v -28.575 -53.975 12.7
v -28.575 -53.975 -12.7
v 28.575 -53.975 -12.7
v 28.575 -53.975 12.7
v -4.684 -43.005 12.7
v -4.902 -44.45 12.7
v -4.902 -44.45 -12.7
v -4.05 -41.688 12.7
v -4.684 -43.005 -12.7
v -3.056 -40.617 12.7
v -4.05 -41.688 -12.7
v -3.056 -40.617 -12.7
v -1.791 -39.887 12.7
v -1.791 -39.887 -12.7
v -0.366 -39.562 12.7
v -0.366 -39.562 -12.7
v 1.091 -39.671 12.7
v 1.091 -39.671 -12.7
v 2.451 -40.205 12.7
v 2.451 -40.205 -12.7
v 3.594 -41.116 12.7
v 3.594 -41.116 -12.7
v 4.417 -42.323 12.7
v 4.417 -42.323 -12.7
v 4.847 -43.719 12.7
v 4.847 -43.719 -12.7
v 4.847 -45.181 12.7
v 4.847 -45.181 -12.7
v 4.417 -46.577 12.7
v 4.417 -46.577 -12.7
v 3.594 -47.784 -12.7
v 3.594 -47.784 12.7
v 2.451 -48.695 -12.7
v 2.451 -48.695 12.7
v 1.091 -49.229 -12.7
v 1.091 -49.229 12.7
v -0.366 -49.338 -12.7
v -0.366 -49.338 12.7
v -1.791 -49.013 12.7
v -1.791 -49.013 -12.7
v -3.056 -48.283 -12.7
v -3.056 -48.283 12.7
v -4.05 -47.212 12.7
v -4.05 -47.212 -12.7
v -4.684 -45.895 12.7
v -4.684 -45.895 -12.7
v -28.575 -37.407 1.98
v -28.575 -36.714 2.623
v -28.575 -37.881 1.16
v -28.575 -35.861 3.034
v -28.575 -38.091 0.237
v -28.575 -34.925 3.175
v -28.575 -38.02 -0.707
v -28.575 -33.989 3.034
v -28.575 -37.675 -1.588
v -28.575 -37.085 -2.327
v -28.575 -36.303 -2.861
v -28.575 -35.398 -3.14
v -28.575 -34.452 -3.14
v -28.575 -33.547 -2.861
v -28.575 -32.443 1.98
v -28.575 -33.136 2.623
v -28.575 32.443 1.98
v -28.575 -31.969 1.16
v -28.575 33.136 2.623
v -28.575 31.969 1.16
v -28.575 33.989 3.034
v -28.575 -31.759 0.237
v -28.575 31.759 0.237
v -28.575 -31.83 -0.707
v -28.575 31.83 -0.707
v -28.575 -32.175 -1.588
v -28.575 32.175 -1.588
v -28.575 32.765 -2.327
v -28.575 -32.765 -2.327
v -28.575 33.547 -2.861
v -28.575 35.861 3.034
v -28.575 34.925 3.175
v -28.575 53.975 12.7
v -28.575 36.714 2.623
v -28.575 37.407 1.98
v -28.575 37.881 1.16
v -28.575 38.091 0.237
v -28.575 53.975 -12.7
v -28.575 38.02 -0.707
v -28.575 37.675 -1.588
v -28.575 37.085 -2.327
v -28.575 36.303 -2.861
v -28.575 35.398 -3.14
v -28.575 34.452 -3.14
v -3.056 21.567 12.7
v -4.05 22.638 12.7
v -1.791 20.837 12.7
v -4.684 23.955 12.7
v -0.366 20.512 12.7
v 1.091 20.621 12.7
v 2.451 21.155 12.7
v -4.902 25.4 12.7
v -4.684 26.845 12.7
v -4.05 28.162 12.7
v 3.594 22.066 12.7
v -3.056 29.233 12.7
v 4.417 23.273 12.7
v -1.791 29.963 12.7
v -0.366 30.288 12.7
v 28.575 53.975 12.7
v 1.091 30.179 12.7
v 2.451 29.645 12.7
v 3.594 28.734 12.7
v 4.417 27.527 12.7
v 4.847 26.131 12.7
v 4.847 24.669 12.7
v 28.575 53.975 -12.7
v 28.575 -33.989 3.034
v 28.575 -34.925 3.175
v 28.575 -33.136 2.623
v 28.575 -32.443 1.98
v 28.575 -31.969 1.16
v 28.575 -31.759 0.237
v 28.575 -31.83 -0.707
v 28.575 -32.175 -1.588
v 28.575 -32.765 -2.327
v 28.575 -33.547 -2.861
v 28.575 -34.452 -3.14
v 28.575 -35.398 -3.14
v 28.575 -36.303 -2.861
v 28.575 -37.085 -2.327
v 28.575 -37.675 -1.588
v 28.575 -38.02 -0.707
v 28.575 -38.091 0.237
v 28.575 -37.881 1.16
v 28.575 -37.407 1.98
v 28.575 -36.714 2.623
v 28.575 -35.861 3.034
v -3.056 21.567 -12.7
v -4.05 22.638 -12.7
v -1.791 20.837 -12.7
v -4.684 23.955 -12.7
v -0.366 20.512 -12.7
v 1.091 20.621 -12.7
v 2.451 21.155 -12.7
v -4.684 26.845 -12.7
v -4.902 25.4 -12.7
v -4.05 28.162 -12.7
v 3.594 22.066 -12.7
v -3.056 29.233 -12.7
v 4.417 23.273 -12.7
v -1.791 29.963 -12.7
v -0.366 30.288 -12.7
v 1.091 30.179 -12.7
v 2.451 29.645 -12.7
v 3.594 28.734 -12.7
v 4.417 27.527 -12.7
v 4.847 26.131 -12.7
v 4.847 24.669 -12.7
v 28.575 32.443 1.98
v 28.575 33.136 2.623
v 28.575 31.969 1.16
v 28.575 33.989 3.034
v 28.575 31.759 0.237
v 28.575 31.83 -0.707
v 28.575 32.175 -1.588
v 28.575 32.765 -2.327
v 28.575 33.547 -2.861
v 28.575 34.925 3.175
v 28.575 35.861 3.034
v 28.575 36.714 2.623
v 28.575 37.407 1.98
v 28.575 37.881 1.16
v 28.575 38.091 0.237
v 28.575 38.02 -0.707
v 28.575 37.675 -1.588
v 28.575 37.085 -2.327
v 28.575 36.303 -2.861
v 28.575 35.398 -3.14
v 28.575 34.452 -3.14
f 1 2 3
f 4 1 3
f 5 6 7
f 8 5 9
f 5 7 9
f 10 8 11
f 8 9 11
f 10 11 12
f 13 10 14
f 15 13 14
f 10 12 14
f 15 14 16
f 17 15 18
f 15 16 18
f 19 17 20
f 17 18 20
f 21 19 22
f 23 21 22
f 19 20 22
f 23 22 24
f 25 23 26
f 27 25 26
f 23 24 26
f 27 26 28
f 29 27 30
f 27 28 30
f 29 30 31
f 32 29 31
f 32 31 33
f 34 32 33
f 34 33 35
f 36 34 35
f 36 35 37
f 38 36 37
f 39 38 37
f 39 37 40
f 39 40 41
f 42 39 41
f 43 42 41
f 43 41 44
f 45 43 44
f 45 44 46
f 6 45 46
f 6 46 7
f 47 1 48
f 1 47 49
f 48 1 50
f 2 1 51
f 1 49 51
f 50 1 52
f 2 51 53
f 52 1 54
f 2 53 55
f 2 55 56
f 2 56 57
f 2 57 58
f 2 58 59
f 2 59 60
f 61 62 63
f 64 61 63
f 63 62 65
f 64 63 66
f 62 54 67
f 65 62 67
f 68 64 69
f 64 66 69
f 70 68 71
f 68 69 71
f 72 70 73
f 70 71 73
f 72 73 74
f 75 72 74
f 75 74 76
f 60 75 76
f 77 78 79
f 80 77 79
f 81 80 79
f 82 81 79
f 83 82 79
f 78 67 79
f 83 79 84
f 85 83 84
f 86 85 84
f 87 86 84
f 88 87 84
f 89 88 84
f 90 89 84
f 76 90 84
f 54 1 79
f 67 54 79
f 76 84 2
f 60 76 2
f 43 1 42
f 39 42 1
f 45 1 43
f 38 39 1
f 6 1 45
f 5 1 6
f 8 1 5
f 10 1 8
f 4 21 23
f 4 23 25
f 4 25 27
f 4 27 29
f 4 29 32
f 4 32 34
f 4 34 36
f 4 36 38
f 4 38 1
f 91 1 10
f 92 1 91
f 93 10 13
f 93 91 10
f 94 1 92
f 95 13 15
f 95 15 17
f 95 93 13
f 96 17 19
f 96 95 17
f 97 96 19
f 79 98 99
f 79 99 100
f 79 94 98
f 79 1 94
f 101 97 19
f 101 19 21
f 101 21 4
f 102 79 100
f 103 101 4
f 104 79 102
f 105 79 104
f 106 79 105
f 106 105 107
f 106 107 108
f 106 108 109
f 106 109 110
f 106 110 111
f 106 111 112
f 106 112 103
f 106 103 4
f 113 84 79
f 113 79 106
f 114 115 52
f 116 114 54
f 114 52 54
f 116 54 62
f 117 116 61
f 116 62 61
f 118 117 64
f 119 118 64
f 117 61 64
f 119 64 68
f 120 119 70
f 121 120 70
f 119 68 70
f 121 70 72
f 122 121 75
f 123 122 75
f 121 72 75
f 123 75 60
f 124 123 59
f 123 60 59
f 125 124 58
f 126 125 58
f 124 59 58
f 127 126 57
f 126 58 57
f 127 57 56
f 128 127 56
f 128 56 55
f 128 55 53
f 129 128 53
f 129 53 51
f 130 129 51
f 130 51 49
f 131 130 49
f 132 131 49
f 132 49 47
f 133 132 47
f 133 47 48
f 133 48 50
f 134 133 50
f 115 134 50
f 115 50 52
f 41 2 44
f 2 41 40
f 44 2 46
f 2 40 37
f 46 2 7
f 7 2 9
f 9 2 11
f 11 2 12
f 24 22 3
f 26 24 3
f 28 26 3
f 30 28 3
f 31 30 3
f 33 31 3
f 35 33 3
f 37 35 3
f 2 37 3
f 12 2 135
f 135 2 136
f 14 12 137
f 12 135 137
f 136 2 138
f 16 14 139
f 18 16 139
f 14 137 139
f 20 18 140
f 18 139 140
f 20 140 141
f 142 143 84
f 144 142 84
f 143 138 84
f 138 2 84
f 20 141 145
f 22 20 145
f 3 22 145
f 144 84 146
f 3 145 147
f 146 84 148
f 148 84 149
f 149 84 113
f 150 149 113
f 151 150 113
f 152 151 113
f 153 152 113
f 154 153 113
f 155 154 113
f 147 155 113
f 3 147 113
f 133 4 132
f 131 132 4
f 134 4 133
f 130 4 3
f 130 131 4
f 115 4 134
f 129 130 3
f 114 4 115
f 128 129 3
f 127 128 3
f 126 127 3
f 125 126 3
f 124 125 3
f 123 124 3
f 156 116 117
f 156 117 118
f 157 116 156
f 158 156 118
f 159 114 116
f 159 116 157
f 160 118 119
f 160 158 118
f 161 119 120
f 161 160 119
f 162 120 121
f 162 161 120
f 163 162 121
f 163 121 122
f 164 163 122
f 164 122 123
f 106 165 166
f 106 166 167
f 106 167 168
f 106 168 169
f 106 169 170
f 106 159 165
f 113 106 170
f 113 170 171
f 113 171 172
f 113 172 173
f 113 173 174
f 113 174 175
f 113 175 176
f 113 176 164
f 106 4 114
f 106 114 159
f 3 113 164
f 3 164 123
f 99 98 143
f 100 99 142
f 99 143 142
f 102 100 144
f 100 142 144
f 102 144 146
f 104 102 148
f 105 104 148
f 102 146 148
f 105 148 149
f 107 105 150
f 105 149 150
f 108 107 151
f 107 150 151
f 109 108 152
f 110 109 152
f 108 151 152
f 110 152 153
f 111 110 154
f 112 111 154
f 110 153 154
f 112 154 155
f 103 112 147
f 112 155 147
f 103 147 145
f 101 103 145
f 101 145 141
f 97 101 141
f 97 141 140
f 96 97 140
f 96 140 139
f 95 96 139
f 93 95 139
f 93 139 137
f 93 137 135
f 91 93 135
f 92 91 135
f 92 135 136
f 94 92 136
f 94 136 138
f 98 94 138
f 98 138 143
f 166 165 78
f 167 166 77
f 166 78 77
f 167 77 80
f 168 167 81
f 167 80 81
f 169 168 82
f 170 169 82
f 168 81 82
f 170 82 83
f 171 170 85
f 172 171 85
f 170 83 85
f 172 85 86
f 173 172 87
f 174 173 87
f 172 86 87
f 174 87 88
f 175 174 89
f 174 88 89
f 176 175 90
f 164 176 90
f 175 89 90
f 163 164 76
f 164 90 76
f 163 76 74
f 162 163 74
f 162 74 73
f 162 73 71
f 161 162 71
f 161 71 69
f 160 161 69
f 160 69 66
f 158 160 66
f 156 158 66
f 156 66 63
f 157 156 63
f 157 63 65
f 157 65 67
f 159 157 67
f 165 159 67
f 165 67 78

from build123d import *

# Parameters (mm, degrees)
SKETCH1_W                   = 57.15
SKETCH1_H                   = 25.4
BOSS_EXTRUDE1_DEPTH         = 53.975
F_1_4_0_25_DIAMETER_HOLE1_D = 6.35
F_3_8_CLEARANCE_HOLE1_D     = 9.8044


with BuildPart() as part:
    # Sketch1 → Boss-Extrude1 (new, symmetric)
    with BuildSketch(Plane(origin=(0, 0, 0), x_dir=(1, 0, 0), z_dir=(0, 1, 0))):
        Rectangle(SKETCH1_W, SKETCH1_H)
    extrude(amount=BOSS_EXTRUDE1_DEPTH, both=True)

    # 1/4 (0.25) Diameter Hole1 (through all)
    with Locations(Plane(origin=(28.575, 0, 0), x_dir=(0, 0, -1), z_dir=(1, 0, 0))):
        with Locations((0, -34.925), (0, 34.925)):
            Hole(F_1_4_0_25_DIAMETER_HOLE1_D / 2)

    # 3/8 Clearance Hole1 (through all)
    with Locations(Plane.XY.offset(12.7)):
        with Locations((0, -44.45), (0, 25.4)):
            Hole(F_3_8_CLEARANCE_HOLE1_D / 2)


solid = part.part
